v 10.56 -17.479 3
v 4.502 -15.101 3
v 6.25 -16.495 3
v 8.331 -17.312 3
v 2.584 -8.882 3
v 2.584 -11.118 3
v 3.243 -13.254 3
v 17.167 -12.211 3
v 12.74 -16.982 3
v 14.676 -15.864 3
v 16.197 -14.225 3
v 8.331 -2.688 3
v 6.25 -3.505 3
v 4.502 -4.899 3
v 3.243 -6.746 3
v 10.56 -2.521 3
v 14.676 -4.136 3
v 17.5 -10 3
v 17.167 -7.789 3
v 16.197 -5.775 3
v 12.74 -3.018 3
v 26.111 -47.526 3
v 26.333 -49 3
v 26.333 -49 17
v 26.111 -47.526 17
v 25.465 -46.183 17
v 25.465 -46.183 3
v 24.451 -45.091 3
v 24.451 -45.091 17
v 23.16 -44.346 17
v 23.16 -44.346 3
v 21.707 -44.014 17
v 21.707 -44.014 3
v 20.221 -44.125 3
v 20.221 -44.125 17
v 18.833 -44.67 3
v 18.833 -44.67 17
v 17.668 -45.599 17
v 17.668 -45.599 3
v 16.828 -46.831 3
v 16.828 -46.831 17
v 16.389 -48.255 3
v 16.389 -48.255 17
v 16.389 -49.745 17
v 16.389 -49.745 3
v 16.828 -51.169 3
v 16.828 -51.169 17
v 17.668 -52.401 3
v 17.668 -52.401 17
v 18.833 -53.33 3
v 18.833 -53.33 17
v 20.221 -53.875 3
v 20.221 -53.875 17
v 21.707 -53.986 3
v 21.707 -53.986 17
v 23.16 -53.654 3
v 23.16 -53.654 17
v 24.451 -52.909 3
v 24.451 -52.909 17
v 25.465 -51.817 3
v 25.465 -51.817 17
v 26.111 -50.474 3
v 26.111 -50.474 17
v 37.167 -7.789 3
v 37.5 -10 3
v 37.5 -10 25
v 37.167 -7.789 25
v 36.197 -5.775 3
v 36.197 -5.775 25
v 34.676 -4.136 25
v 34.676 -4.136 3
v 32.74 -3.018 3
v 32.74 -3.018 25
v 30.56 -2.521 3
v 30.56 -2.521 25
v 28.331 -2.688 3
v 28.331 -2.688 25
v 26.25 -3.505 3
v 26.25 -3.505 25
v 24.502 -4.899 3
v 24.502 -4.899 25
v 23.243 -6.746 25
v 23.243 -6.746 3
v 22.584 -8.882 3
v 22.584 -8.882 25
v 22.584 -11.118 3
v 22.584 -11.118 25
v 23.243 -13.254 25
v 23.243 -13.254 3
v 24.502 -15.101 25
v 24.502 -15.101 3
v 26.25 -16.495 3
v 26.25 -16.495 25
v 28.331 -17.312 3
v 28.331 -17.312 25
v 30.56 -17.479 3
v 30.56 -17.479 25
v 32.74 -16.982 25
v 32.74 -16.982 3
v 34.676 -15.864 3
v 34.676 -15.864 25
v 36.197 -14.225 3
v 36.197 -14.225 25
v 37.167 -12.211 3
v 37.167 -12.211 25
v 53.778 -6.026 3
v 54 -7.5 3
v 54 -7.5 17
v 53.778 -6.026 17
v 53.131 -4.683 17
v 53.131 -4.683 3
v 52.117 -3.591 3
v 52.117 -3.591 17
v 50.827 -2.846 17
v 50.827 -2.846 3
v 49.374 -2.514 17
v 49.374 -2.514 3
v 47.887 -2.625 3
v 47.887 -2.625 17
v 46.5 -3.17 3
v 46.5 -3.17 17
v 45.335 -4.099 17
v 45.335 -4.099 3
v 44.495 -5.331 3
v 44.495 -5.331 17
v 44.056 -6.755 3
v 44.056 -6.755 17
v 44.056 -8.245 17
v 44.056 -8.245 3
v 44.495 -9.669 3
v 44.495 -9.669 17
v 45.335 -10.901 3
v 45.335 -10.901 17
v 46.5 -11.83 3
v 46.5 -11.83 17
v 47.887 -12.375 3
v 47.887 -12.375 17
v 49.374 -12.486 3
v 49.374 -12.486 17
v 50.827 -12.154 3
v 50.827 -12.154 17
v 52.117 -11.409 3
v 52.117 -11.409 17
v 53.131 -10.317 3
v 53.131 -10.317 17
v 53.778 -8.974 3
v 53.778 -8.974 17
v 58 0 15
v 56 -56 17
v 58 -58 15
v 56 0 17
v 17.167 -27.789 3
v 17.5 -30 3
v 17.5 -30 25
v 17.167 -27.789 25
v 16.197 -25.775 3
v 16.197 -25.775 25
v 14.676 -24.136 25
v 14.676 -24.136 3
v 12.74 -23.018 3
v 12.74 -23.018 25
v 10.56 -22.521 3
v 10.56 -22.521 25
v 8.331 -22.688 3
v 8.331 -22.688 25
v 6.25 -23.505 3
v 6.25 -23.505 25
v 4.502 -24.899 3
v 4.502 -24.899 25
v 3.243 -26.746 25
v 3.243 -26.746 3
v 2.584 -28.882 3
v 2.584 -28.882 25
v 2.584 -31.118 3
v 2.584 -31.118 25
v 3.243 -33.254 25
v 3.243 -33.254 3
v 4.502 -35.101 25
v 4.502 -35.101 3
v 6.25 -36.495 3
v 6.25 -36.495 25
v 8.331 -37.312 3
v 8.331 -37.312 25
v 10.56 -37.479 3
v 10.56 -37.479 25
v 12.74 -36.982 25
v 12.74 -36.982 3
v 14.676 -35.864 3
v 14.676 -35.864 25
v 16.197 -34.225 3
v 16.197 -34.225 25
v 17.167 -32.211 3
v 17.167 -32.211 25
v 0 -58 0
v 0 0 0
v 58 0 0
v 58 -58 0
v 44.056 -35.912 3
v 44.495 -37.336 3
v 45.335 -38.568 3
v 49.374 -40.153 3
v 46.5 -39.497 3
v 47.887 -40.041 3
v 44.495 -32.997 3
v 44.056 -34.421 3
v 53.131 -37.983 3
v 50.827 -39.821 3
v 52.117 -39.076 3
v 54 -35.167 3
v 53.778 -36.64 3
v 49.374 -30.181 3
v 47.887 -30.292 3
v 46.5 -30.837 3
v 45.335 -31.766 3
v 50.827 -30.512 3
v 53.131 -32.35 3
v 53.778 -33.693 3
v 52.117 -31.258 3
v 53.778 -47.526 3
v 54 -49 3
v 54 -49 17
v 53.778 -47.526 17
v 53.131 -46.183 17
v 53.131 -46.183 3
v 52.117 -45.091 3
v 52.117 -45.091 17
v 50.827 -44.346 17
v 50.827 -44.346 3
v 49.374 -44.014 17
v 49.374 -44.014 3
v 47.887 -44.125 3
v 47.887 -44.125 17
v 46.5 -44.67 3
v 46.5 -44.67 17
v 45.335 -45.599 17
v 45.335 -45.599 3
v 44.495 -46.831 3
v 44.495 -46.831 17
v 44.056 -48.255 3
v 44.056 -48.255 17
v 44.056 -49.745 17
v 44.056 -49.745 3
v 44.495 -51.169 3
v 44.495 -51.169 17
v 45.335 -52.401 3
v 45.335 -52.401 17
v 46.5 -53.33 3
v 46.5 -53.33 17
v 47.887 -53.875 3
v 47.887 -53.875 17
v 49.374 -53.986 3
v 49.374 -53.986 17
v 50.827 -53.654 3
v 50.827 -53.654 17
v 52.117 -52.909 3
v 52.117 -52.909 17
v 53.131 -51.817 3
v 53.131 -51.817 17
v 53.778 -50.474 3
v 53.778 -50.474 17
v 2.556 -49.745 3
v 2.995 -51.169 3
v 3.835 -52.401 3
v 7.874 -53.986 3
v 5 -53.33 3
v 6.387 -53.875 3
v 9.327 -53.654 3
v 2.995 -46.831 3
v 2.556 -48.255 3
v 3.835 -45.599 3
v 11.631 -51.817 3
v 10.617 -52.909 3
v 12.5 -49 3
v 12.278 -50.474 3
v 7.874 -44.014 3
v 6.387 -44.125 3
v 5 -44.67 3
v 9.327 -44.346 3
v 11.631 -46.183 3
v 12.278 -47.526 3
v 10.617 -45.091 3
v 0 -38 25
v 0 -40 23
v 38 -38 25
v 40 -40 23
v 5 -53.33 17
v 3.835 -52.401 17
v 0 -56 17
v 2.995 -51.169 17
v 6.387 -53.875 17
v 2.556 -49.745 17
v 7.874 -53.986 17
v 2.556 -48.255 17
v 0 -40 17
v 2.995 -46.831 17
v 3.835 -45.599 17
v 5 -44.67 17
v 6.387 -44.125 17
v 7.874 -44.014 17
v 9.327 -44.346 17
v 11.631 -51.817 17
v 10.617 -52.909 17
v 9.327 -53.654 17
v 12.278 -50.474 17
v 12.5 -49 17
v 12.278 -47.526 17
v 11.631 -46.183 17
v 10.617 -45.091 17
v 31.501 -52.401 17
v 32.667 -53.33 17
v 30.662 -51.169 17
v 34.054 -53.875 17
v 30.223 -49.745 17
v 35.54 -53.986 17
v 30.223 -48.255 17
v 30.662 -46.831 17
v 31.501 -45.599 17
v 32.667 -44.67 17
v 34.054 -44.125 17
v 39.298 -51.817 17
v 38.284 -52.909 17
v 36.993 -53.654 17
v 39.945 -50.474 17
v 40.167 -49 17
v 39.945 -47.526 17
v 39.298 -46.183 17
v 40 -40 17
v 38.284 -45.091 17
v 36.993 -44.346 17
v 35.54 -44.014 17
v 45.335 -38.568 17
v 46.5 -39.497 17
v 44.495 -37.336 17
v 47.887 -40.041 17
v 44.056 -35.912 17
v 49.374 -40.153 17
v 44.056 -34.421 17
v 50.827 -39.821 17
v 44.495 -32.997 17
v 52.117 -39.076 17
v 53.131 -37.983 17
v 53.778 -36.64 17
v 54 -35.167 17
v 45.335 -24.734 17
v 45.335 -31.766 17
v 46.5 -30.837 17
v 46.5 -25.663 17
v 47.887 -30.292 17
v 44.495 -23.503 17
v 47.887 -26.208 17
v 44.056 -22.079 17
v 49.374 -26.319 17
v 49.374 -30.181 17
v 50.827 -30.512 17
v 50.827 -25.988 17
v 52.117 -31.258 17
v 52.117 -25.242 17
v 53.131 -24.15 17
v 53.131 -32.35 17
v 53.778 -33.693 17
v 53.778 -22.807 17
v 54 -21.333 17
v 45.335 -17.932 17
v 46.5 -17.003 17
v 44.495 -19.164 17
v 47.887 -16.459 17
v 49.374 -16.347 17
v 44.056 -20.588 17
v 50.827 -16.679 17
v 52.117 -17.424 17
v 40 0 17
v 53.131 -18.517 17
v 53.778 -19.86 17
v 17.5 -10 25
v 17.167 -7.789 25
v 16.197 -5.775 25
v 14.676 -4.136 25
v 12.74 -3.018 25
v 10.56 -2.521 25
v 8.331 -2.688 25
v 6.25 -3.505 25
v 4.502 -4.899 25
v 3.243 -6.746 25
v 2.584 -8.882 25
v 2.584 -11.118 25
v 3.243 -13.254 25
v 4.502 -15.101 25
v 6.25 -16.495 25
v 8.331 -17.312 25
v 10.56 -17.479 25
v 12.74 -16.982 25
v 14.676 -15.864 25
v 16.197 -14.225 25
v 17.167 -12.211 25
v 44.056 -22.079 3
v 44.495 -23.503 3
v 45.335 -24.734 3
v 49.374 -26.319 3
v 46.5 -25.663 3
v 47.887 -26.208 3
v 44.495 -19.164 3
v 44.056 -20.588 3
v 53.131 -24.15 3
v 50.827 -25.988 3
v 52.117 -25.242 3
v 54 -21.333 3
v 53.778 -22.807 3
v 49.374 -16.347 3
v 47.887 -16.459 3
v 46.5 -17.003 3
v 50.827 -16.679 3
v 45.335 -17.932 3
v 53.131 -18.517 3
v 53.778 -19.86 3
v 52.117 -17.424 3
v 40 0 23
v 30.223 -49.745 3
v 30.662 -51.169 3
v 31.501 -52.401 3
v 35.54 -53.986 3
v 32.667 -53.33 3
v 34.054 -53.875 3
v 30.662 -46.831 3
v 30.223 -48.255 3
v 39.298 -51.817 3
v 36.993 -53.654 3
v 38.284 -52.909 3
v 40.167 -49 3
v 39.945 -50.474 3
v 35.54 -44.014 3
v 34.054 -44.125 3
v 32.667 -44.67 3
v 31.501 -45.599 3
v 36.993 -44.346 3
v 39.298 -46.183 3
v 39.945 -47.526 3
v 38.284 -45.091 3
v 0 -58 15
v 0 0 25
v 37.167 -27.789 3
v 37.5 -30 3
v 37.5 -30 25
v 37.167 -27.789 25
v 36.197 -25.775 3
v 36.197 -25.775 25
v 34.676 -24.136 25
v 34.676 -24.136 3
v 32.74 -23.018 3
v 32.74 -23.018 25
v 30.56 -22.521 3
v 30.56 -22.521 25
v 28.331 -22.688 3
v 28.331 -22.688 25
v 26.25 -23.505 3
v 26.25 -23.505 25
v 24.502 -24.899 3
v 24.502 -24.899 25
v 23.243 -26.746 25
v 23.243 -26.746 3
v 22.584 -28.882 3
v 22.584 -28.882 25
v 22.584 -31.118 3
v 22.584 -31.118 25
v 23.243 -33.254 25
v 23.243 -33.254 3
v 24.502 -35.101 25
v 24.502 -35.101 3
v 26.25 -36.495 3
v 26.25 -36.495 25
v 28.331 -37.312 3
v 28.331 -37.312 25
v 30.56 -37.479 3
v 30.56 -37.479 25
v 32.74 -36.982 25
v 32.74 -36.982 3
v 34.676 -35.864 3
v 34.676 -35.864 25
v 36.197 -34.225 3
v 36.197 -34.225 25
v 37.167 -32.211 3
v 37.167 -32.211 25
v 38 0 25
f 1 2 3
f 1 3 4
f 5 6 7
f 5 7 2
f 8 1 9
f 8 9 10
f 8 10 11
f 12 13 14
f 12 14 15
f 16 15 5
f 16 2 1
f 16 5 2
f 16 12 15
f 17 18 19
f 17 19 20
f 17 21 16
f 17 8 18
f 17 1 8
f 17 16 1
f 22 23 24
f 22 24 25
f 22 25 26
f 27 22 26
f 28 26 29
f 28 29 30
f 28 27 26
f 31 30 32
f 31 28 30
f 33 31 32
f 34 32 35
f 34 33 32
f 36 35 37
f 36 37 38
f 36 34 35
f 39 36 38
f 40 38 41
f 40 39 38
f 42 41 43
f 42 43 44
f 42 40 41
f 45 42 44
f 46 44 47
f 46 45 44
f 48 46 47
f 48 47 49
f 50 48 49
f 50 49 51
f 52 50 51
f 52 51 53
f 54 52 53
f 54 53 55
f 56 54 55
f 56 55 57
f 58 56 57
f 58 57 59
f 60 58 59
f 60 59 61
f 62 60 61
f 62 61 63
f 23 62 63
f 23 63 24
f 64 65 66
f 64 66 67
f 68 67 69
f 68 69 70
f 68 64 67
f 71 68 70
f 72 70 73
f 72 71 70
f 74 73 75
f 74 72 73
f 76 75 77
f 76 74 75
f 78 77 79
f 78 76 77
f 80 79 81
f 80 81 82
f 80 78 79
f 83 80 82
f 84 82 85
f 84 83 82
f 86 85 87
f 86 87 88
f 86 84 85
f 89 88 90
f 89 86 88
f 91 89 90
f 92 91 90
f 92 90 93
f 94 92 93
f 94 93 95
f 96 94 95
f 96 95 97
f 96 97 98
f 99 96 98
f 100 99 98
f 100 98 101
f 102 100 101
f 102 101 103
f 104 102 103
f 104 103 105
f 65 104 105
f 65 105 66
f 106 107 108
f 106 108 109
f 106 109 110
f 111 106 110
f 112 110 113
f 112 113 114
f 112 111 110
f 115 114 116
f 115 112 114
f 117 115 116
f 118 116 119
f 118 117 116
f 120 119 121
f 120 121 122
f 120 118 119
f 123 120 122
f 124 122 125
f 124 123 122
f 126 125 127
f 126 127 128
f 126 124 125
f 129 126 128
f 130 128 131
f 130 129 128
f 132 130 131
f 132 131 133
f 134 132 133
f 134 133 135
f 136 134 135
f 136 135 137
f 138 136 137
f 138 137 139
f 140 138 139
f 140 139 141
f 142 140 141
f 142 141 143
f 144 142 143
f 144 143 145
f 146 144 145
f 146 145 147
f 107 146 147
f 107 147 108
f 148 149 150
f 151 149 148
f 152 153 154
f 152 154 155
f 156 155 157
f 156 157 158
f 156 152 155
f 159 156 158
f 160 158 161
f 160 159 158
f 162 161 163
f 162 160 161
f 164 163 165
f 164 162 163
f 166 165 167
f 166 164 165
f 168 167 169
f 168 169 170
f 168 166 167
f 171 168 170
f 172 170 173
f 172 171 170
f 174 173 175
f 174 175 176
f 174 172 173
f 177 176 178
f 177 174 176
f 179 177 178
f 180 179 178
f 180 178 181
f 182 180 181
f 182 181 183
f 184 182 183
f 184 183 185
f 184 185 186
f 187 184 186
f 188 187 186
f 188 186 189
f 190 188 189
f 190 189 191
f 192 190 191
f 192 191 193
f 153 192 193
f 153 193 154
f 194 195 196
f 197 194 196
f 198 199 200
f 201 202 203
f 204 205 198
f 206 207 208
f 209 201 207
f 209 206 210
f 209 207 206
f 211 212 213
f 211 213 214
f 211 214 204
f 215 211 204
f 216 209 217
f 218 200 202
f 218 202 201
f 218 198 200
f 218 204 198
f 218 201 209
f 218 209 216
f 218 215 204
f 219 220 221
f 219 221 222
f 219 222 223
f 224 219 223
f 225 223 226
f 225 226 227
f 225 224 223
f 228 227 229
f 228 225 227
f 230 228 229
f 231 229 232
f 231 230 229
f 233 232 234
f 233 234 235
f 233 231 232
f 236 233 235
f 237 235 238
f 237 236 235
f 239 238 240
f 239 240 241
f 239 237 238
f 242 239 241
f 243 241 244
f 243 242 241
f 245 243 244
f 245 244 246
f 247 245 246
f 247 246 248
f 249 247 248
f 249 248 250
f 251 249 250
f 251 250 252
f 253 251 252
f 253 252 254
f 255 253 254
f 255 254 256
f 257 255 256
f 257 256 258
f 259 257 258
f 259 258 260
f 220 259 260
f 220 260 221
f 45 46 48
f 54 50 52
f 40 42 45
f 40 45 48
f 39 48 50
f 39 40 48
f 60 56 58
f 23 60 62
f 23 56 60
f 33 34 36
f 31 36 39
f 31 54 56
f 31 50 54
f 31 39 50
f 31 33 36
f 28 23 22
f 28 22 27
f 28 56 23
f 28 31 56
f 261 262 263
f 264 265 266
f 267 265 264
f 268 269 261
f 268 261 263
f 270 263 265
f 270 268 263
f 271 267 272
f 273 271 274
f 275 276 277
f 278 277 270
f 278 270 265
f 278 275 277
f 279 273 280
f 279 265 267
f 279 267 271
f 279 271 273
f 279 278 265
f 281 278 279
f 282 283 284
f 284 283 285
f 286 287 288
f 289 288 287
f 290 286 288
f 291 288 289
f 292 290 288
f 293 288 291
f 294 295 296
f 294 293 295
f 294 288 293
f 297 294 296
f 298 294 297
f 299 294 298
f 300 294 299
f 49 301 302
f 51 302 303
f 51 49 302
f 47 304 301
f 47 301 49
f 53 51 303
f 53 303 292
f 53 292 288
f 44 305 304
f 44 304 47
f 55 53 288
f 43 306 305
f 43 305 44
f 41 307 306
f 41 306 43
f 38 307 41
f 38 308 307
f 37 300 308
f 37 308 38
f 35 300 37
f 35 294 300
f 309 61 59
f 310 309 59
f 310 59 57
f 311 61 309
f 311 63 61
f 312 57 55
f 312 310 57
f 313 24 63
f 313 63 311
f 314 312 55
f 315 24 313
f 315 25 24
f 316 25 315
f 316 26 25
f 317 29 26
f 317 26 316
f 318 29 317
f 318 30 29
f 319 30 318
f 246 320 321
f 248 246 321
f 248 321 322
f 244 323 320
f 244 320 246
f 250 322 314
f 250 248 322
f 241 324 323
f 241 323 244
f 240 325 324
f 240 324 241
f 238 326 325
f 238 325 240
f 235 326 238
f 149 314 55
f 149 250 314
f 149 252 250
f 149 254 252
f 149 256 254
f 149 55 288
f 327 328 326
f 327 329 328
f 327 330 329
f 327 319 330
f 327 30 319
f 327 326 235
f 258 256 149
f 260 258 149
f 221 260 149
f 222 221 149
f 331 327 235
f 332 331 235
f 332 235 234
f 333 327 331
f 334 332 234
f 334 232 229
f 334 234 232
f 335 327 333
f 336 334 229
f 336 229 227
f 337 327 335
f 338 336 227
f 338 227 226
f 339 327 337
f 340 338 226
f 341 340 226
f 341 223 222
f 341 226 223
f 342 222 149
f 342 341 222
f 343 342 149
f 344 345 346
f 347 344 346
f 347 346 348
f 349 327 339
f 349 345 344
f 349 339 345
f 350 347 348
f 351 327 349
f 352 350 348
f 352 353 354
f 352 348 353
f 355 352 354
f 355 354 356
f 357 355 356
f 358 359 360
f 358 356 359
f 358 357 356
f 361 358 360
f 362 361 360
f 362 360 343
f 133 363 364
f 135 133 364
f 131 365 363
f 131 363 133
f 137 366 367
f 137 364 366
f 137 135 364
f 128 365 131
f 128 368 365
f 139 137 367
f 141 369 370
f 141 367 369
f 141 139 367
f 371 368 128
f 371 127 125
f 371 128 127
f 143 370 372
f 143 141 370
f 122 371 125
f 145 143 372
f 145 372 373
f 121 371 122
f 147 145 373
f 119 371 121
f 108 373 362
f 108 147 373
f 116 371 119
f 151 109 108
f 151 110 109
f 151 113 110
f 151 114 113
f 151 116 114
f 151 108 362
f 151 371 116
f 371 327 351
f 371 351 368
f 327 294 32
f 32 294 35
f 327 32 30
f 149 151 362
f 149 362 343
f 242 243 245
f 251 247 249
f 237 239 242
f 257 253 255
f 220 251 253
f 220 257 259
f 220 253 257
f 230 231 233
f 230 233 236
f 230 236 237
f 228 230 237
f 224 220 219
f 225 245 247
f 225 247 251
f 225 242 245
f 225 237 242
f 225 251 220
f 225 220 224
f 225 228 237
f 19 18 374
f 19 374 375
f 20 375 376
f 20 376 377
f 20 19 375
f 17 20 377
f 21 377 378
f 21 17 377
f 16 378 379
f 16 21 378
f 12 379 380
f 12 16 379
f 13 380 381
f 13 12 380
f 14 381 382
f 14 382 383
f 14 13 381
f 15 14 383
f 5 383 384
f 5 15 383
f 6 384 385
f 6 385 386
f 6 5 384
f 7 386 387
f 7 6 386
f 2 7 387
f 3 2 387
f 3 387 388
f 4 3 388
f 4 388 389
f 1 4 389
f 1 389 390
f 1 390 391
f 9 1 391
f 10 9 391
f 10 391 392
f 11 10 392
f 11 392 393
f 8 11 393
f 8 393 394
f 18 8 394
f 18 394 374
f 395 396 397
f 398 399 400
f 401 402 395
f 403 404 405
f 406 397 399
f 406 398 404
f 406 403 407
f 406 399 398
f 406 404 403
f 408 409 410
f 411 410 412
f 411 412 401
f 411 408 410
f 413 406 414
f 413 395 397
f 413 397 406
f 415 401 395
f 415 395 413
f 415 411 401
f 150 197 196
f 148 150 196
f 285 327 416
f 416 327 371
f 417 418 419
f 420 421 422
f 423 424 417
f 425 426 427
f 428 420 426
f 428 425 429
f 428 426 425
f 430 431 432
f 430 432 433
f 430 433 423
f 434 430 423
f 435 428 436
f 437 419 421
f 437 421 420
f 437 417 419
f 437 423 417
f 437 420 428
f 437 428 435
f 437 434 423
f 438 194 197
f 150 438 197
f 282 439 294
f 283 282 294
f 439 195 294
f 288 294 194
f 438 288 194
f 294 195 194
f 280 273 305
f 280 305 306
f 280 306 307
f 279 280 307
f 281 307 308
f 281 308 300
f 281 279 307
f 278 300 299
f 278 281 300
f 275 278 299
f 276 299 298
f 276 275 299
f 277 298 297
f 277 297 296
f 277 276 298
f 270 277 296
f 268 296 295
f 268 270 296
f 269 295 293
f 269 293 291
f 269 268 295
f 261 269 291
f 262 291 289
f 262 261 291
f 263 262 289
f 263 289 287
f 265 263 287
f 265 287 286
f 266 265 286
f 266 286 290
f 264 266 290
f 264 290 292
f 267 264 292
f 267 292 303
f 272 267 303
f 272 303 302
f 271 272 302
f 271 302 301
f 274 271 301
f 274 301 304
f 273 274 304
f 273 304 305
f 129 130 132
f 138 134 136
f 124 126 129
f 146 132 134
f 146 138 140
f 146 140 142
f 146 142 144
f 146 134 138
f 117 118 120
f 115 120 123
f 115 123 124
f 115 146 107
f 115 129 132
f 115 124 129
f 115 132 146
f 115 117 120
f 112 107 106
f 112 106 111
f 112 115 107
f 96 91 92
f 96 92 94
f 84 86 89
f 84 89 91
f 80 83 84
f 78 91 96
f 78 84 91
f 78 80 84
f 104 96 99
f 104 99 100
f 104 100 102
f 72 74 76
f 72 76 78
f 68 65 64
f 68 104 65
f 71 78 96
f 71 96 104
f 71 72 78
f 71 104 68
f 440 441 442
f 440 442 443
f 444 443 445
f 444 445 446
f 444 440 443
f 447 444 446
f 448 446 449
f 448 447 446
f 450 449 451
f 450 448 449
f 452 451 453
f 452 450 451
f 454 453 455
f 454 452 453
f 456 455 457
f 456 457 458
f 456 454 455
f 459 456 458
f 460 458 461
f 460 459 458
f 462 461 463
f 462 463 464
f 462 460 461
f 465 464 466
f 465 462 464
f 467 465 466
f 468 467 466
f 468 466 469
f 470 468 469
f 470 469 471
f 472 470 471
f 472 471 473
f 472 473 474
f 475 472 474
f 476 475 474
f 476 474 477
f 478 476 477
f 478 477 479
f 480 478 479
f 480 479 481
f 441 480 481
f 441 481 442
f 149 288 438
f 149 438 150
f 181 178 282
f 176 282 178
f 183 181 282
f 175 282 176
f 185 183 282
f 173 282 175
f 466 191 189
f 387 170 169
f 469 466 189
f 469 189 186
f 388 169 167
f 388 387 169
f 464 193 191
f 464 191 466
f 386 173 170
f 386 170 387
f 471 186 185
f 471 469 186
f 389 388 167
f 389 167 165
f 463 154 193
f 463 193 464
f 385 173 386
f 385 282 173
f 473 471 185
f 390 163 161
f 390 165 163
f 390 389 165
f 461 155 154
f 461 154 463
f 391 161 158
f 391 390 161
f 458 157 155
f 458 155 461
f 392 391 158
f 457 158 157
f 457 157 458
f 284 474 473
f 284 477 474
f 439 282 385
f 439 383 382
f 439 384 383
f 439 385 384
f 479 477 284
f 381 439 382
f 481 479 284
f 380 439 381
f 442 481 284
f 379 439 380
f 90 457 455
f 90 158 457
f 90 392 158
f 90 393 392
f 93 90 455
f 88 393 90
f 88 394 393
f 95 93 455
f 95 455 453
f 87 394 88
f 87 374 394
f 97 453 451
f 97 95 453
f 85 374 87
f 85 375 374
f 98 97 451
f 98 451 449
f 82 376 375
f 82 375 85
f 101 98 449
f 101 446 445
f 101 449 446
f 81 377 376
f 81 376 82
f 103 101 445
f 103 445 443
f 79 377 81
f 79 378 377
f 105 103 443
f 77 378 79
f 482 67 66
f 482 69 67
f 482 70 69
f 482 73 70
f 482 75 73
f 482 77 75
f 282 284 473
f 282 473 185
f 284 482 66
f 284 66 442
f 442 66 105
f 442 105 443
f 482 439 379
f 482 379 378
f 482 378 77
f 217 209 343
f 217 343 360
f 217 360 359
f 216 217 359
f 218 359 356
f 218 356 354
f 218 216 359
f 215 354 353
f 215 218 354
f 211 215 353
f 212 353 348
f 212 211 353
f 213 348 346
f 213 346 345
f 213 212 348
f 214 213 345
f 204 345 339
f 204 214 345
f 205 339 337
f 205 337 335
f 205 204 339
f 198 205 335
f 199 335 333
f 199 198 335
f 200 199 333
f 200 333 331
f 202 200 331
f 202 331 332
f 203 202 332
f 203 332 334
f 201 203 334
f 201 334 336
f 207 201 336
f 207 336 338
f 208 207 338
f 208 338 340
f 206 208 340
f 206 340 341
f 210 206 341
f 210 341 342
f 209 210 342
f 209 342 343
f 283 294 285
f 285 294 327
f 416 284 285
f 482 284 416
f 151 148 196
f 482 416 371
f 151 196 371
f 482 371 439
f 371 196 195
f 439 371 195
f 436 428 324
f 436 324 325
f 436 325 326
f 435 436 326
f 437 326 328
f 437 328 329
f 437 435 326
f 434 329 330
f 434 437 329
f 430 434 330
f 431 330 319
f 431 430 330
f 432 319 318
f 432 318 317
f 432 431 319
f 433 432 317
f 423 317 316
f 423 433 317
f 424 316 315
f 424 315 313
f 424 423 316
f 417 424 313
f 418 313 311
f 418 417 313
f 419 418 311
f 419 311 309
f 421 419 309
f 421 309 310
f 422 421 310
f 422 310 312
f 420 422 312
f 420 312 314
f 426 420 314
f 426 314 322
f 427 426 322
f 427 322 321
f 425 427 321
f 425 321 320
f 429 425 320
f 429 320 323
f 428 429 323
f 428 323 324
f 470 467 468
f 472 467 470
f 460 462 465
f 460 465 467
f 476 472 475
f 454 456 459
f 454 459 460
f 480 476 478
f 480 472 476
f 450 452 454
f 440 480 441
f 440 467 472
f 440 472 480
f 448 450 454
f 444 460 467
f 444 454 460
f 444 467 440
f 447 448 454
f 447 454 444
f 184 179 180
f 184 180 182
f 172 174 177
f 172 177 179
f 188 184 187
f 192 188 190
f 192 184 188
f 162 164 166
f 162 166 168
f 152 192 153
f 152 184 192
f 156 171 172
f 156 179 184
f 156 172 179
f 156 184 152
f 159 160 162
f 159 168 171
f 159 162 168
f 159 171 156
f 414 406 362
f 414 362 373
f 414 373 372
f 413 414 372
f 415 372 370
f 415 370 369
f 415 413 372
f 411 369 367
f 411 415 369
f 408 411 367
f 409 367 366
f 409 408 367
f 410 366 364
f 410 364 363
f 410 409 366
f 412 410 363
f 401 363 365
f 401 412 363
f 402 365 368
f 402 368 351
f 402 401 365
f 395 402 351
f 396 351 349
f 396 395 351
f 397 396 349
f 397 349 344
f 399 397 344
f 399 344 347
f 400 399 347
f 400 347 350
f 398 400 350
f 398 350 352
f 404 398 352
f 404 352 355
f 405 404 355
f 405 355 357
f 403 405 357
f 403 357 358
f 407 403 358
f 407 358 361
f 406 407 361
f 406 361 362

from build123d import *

# Parameters (mm, degrees)
F0_R     = 7.5
F1_DEPTH = 25
F0_R_2   = 5
F2_DEPTH = 17
F3_DEPTH = 3
F4_SIZE  = 2


with BuildPart() as f1:
    # F0 (on Top) → F1 (new body)
    with BuildSketch(Plane.XY):
        Polygon((20, 0), (0, 0), (0, -20), (0, -40), (40, -40), (40, 0), align=None)
        with Locations((10, -30)):
            Circle(F0_R, mode=Mode.SUBTRACT)
        with Locations((30, -30)):
            Circle(F0_R, mode=Mode.SUBTRACT)
        with Locations((10, -10)):
            Circle(F0_R, mode=Mode.SUBTRACT)
        with Locations((30, -10)):
            Circle(F0_R, mode=Mode.SUBTRACT)
    extrude(amount=F1_DEPTH)

    # F0 (on Top) → F2 (join)
    with BuildSketch(Plane.XY):
        Polygon((58, 0), (40, 0), (40, -40), (0, -40), (0, -58), (58, -58), align=None)
        with Locations((7.5, -49)):
            Circle(F0_R_2, mode=Mode.SUBTRACT)
        with Locations((21.333333, -49)):
            Circle(F0_R_2, mode=Mode.SUBTRACT)
        with Locations((35.166667, -49)):
            Circle(F0_R_2, mode=Mode.SUBTRACT)
        with Locations((49, -49)):
            Circle(F0_R_2, mode=Mode.SUBTRACT)
        with Locations((49, -35.166667)):
            Circle(F0_R_2, mode=Mode.SUBTRACT)
        with Locations((49, -21.333333)):
            Circle(F0_R_2, mode=Mode.SUBTRACT)
        with Locations((49, -7.5)):
            Circle(F0_R_2, mode=Mode.SUBTRACT)
    extrude(amount=F2_DEPTH)

    # F0 (on Top) → F3 (join)
    with BuildSketch(Plane.XY):
        with Locations((10, -10)):
            Circle(F0_R)
        with Locations((30, -10)):
            Circle(F0_R)
        with Locations((30, -30)):
            Circle(F0_R)
        with Locations((10, -30)):
            Circle(F0_R)
        with Locations((7.5, -49)):
            Circle(F0_R_2)
        with Locations((21.333333, -49)):
            Circle(F0_R_2)
        with Locations((35.166667, -49)):
            Circle(F0_R_2)
        with Locations((49, -49)):
            Circle(F0_R_2)
        with Locations((49, -35.166667)):
            Circle(F0_R_2)
        with Locations((49, -21.333333)):
            Circle(F0_R_2)
        with Locations((49, -7.5)):
            Circle(F0_R_2)
    extrude(amount=F3_DEPTH)

    # F4
    f4_edges = [f1.edges().sort_by_distance(p)[0] for p in [
        (20, -40, 25),
        (40, -20, 25),
        (29, -58, 17),
        (58, -29, 17),
    ]]
    chamfer(f4_edges, length=F4_SIZE)


solid = f1.part
